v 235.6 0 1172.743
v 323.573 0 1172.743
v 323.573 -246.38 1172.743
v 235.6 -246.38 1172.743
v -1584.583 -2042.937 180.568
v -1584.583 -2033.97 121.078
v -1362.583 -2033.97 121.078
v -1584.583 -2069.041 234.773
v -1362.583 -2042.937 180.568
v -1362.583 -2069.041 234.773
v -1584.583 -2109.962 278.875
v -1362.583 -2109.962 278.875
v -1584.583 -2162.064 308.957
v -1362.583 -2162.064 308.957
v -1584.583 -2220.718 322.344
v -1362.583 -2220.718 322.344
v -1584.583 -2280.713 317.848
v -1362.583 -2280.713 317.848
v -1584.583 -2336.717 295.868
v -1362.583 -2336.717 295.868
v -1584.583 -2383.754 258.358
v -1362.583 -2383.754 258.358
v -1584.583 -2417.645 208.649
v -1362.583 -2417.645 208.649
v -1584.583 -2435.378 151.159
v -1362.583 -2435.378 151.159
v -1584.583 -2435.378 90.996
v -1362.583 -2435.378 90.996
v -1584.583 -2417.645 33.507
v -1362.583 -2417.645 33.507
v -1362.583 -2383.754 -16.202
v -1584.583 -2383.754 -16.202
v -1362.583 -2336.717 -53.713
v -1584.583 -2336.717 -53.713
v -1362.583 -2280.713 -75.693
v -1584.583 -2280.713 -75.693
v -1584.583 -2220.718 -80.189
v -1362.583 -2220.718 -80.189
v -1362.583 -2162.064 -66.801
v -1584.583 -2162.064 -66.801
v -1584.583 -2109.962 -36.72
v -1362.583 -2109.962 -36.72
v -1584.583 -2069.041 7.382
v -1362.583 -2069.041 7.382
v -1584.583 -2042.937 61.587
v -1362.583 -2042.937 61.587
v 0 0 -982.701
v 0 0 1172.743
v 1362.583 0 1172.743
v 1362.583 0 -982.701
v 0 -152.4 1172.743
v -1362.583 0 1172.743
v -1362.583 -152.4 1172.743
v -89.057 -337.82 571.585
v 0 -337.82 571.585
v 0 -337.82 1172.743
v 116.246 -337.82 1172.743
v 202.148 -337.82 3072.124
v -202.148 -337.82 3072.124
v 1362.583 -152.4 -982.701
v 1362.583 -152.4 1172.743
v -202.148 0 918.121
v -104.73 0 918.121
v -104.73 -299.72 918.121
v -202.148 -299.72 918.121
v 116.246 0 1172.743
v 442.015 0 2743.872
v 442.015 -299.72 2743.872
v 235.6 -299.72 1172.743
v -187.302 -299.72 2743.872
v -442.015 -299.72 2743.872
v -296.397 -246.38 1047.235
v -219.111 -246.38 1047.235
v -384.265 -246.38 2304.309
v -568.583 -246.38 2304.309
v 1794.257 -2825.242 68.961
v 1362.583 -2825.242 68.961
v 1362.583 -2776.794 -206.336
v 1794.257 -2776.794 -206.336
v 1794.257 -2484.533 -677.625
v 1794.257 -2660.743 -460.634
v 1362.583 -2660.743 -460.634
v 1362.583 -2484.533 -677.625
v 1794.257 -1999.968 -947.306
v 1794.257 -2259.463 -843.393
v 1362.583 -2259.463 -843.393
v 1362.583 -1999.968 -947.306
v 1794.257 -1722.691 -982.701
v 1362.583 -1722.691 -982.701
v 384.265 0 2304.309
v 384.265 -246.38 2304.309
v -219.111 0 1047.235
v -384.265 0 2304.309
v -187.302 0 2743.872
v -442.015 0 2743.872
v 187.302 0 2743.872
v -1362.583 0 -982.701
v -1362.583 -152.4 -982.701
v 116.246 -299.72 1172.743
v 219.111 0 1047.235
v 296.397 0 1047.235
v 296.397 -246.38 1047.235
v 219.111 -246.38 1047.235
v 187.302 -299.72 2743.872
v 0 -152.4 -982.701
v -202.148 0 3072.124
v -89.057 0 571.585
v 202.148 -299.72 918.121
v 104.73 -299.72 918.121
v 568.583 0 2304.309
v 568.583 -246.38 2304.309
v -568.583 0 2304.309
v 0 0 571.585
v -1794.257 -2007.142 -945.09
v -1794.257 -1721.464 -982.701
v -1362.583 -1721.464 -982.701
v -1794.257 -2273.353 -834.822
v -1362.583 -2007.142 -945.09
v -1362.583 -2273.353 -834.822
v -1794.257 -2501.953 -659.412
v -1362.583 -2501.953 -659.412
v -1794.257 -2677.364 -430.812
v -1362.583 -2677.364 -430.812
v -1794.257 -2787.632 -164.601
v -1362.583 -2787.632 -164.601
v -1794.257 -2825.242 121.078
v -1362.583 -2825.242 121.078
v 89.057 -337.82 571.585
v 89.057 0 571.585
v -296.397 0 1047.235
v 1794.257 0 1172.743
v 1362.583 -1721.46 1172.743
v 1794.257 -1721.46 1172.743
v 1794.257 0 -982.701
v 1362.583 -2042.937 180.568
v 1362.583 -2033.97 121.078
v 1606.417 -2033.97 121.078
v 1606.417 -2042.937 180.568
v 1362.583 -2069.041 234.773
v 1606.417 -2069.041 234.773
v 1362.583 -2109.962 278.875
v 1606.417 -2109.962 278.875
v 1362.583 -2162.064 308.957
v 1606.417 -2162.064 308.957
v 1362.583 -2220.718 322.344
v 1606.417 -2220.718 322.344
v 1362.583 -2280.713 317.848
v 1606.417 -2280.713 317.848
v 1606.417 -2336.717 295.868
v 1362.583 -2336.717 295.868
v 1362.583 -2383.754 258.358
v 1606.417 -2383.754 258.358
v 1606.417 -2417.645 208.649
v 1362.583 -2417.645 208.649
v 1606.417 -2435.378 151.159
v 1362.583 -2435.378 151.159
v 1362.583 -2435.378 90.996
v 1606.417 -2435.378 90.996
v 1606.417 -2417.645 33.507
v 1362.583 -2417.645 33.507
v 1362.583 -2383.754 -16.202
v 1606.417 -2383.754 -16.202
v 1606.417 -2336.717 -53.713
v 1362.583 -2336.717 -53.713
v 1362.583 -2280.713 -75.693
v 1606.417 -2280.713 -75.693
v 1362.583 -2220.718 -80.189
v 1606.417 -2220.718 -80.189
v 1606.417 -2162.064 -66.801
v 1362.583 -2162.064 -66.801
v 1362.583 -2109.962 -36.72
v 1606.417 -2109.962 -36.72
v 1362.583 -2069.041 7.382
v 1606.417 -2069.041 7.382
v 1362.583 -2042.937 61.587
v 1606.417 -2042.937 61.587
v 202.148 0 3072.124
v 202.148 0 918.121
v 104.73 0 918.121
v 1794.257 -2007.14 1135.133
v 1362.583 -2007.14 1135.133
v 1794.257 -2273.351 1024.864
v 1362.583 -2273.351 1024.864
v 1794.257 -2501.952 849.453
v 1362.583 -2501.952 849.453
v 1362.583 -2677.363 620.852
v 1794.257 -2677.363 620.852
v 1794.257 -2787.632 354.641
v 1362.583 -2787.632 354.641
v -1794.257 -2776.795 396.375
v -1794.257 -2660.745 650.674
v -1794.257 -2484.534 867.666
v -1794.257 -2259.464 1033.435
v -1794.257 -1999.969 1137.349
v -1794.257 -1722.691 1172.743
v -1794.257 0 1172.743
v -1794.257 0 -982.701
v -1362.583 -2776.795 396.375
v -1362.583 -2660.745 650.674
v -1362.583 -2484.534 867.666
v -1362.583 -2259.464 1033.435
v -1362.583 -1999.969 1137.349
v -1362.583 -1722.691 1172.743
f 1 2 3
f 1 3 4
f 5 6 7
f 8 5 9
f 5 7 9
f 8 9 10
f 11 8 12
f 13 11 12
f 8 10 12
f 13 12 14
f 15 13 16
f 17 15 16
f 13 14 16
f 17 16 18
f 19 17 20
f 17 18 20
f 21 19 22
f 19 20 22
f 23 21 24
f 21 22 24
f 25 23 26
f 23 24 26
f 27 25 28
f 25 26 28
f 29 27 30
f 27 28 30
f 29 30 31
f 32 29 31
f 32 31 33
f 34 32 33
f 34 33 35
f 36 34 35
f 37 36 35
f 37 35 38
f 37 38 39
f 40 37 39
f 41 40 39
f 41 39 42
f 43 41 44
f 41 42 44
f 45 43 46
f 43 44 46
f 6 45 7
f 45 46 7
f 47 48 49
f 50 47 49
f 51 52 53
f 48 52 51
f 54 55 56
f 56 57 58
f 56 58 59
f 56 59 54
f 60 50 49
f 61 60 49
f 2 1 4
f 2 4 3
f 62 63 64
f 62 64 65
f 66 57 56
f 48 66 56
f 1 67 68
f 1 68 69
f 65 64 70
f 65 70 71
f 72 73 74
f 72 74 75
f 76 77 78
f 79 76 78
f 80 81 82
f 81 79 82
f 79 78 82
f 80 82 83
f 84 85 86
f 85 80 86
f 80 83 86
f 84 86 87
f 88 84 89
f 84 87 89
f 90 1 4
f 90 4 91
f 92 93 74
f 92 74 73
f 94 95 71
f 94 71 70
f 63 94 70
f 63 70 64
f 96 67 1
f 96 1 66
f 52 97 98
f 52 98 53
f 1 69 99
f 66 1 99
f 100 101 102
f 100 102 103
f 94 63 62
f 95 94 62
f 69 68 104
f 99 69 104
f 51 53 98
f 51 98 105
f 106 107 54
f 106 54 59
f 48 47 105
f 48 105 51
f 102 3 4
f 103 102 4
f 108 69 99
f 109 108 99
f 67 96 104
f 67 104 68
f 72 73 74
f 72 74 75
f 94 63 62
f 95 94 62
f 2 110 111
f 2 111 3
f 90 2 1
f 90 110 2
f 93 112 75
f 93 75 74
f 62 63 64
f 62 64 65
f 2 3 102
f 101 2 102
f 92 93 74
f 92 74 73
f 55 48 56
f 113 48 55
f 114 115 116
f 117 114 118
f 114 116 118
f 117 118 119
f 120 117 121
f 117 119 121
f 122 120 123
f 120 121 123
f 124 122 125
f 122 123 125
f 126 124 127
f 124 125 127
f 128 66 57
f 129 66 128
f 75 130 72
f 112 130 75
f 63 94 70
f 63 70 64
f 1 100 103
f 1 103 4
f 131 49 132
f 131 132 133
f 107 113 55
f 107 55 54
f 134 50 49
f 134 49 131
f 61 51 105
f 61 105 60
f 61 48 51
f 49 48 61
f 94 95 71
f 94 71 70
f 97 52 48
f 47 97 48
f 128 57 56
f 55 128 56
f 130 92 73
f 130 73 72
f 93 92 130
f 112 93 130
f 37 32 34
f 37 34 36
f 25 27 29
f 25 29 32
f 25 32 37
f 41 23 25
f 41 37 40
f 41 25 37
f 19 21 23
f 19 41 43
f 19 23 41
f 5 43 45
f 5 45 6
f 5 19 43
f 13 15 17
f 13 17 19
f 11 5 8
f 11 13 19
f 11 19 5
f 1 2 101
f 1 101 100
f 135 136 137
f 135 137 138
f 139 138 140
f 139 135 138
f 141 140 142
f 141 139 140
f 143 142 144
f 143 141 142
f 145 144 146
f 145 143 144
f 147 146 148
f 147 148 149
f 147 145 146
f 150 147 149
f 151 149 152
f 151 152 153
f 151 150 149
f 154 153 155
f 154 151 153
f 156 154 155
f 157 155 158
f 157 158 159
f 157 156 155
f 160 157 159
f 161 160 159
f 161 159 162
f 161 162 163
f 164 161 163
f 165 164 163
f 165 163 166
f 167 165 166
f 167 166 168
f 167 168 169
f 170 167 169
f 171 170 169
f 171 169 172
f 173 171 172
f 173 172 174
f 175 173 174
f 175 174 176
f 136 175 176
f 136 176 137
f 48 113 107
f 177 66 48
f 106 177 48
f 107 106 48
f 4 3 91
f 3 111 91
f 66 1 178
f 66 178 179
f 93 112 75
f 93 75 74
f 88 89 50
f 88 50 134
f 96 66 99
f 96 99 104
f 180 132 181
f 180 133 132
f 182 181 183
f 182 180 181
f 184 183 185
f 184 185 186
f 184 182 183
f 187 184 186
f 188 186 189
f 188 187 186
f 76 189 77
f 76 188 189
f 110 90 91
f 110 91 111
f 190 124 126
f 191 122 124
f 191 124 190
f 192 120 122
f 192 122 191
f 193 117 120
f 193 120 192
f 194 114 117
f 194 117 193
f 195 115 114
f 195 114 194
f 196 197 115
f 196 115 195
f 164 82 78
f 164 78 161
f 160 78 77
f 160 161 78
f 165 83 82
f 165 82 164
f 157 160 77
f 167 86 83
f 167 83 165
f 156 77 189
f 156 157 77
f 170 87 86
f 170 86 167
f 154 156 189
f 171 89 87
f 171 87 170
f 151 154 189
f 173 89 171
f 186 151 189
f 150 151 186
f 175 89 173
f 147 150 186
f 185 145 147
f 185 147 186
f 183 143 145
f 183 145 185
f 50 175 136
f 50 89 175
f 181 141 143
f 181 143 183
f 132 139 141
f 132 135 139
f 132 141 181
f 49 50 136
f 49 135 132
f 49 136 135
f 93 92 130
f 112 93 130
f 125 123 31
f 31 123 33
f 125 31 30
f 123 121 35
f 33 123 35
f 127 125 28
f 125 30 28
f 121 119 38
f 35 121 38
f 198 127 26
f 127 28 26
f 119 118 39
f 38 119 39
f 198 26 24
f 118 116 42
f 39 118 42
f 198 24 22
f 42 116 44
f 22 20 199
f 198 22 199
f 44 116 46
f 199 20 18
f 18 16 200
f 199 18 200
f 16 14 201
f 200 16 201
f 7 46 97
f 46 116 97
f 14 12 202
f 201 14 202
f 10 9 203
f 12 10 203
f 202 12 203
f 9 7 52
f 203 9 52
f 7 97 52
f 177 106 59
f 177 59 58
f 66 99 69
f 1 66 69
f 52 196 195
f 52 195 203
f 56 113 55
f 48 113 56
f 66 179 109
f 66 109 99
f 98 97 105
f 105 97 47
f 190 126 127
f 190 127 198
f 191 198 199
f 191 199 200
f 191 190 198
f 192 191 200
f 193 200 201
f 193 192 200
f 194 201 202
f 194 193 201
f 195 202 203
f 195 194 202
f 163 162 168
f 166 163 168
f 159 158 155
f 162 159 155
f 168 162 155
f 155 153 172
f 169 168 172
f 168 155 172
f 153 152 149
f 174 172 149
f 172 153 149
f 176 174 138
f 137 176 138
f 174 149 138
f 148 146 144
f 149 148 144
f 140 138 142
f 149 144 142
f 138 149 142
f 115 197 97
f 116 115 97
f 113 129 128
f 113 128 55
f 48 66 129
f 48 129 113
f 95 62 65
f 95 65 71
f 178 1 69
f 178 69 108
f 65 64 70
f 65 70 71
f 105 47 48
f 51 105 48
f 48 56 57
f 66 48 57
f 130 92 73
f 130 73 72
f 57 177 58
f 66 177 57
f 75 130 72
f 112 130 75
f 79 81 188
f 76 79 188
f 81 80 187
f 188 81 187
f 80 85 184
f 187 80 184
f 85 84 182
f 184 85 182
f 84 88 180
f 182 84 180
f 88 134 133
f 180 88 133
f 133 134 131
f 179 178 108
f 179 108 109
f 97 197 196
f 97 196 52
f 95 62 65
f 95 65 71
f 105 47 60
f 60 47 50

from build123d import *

# Parameters (mm, degrees)
F0_W         = 431.6743224388
F0_H         = 2155.444
F1_DEPTH     = 2825.242
F0_W_2       = 1362.583
F2_DEPTH     = 152.4
F3_R         = 1103.778440717
F4_T1_DEPTH  = 5944.4309410994
F6_DEPTH     = 337.82
F7_DEPTH     = 337.82
F8_DEPTH     = 299.72
F9_DEPTH     = 299.72
F10_DEPTH    = 299.72
F11_DEPTH    = 299.72
F12_DEPTH    = 246.38
F13_DEPTH    = 246.38
F14_DEPTH    = 246.38
F15_DEPTH    = 246.38
F16_DEPTH    = 152.4
F17_DEPTH    = 2825.242
F18_R        = 1103.7824
F19_T1_DEPTH = 5944.4300053009
F20_R        = 201.8308928609
F21_DEPTH    = 222
F22_DEPTH    = 2969


# Not quite as in the source:
# - a fillet or chamfer that OpenCascade refuses, or shapes differently, is made with other operations: its cross-section is extruded or revolved along the edge and cut away or added


with BuildPart() as f1:
    # F0 (on Front) → F1 (new body)
    with BuildSketch(Plane.XZ):
        with Locations((-1578.4201612194, 95.021261747)):
            Rectangle(F0_W, F0_H)
    extrude(amount=F1_DEPTH)

    # F3
    f3_edges = [f1.edges().sort_by_distance(p)[0] for p in [
        (-1578.420161, -2825.242, -982.700738),
    ]]
    fillet(f3_edges, radius=F3_R)

    # F4: fillet of radius 1103.7824 on 1 edges, made by hand

    # F4_s2 → F4_t1 (cut)
    with BuildSketch(Plane.YZ.offset(-4550.6356317691)):
        with BuildLine():
            ThreePointArc((-2825.242, 121.077702464), (-2484.5338146575, 867.6664514598), (-1722.6906762679, 1172.743261747))
            Line((-1722.6906762679, 1172.743261747), (-2825.242, 1172.743261747))
            Line((-2825.242, 1172.743261747), (-2825.242, 121.077702464))
        make_face()
    extrude(amount=F4_T1_DEPTH, mode=Mode.SUBTRACT)

    # F20 (on face) → F21 (cut)
    with BuildSketch(Plane.YZ.offset(-1362.583)):
        with Locations((-2235.8012199402, 121.077702464)):
            Circle(F20_R)
    extrude(amount=-F21_DEPTH, mode=Mode.SUBTRACT)


with BuildPart() as f2:
    # F0 (on Front) → F2 (new body)
    with BuildSketch(Plane.XZ):
        with Locations((681.2915, 95.021261747)):
            Rectangle(F0_W_2, F0_H)
    extrude(amount=F2_DEPTH)


with BuildPart() as f6:
    # F5 (on face) → F6 (new body)
    with BuildSketch(Plane(origin=(0, 0, 0), x_dir=(-1, 0, 0), z_dir=(0, 1, 0))):
        Polygon((202.1480798721, 3072.124004364), (0, 3072.124004364), (-202.1480798721, 3072.124004364), (-187.3023343028, 2743.8715661091), (-116.2455245279, 1172.743261747), (0, 1172.743261747), (0, 571.585059166), (89.0571759208, 571.585059166), (104.7298349479, 918.121278286), (187.3023343028, 2743.8715661091), align=None)
    extrude(amount=-F6_DEPTH)


with BuildPart() as f7:
    # F5 (on face) → F7 (new body)
    with BuildSketch(Plane(origin=(0, 0, 0), x_dir=(-1, 0, 0), z_dir=(0, 1, 0))):
        Polygon((0, 1172.743261747), (-116.2455245279, 1172.743261747), (-104.7298349479, 918.121278286), (-89.0571759208, 571.585059166), (0, 571.585059166), align=None)
    extrude(amount=-F7_DEPTH)


with BuildPart() as f8:
    # F5 (on face) → F8 (new body)
    with BuildSketch(Plane(origin=(0, 0, 0), x_dir=(-1, 0, 0), z_dir=(0, 1, 0))):
        Polygon((-116.2455245279, 1172.743261747), (-187.3023343028, 2743.8715661091), (-442.0145153999, 2743.8715661091), (-384.2649371563, 2304.3089867597), (-235.6002271823, 1172.743261747), align=None)
    extrude(amount=-F8_DEPTH)


with BuildPart() as f9:
    # F5 (on face) → F9 (new body)
    with BuildSketch(Plane(origin=(0, 0, 0), x_dir=(-1, 0, 0), z_dir=(0, 1, 0))):
        Polygon((-104.7298349479, 918.121278286), (-116.2455245279, 1172.743261747), (-235.6002271823, 1172.743261747), (-219.1109658235, 1047.2347736359), (-202.1480798721, 918.121278286), align=None)
    extrude(amount=-F9_DEPTH)


with BuildPart() as f10:
    # F5 (on face) → F10 (new body)
    with BuildSketch(Plane(origin=(0, 0, 0), x_dir=(-1, 0, 0), z_dir=(0, 1, 0))):
        Polygon((442.0145153999, 2743.8715661091), (187.3023343028, 2743.8715661091), (104.7298349479, 918.121278286), (202.1480798721, 918.121278286), (219.1109658235, 1047.2347736359), (384.2649371563, 2304.3089867597), align=None)
    extrude(amount=-F10_DEPTH)


with BuildPart() as f11:
    # F5 (on face) → F11 (new body)
    with BuildSketch(Plane(origin=(0, 0, 0), x_dir=(-1, 0, 0), z_dir=(0, 1, 0))):
        Polygon((442.0145153999, 2743.8715661091), (187.3023343028, 2743.8715661091), (104.7298349479, 918.121278286), (202.1480798721, 918.121278286), (219.1109658235, 1047.2347736359), (384.2649371563, 2304.3089867597), align=None)
    extrude(amount=-F11_DEPTH)


with BuildPart() as f12:
    # F5 (on face) → F12 (new body)
    with BuildSketch(Plane(origin=(0, 0, 0), x_dir=(-1, 0, 0), z_dir=(0, 1, 0))):
        Polygon((-323.5727009185, 1172.743261747), (-235.6002271823, 1172.743261747), (-384.2649371563, 2304.3089867597), (-568.5825943947, 2304.3089867597), align=None)
    extrude(amount=-F12_DEPTH)


with BuildPart() as f13:
    # F5 (on face) → F13 (new body)
    with BuildSketch(Plane(origin=(0, 0, 0), x_dir=(-1, 0, 0), z_dir=(0, 1, 0))):
        Polygon((-219.1109658235, 1047.2347736359), (-235.6002271823, 1172.743261747), (-323.5727009185, 1172.743261747), (-296.3972389698, 1047.2347736359), align=None)
    extrude(amount=-F13_DEPTH)


with BuildPart() as f14:
    # F5 (on face) → F14 (new body)
    with BuildSketch(Plane(origin=(0, 0, 0), x_dir=(-1, 0, 0), z_dir=(0, 1, 0))):
        Polygon((568.5825943947, 2304.3089867597), (384.2649371563, 2304.3089867597), (219.1109658235, 1047.2347736359), (296.3972389698, 1047.2347736359), align=None)
    extrude(amount=-F14_DEPTH)


with BuildPart() as f15:
    # F5 (on face) → F15 (new body)
    with BuildSketch(Plane(origin=(0, 0, 0), x_dir=(-1, 0, 0), z_dir=(0, 1, 0))):
        Polygon((568.5825943947, 2304.3089867597), (384.2649371563, 2304.3089867597), (219.1109658235, 1047.2347736359), (296.3972389698, 1047.2347736359), align=None)
    extrude(amount=-F15_DEPTH)


with BuildPart() as f16:
    # F0 (on Front) → F16 (new body)
    with BuildSketch(Plane.XZ):
        with Locations((-681.2915, 95.021261747)):
            Rectangle(F0_W_2, F0_H)
    extrude(amount=F16_DEPTH)


with BuildPart() as f17:
    # F0 (on Front) → F17 (new body)
    with BuildSketch(Plane.XZ):
        with Locations((1578.4201612194, 95.021261747)):
            Rectangle(F0_W, F0_H)
    extrude(amount=F17_DEPTH)

    # F18
    f18_edges = [f17.edges().sort_by_distance(p)[0] for p in [
        (1578.420161, -2825.242, 1172.743262),
    ]]
    fillet(f18_edges, radius=F18_R)

    # F19: fillet of radius 1103.7824 on 1 edges, made by hand

    # F19_s2 → F19_t1 (cut)
    with BuildSketch(Plane.YZ.offset(-1393.794841431)):
        with BuildLine():
            ThreePointArc((-2825.242, 68.960861747), (-2484.5325677323, -677.6252958612), (-1722.6908634276, -982.700738253))
            Line((-1722.6908634276, -982.700738253), (-2825.242, -982.700738253))
            Line((-2825.242, -982.700738253), (-2825.242, 68.960861747))
        make_face()
    extrude(amount=F19_T1_DEPTH, mode=Mode.SUBTRACT)

    # F20 (on face) → F22 (cut)
    with BuildSketch(Plane.YZ.offset(-1362.583)):
        with Locations((-2235.8012199402, 121.077702464)):
            Circle(F20_R)
    extrude(amount=F22_DEPTH, mode=Mode.SUBTRACT)


solid = Compound([f1.part, f2.part, f6.part, f7.part, f8.part, f9.part, f10.part, f11.part, f12.part, f13.part, f14.part, f15.part, f16.part, f17.part])
